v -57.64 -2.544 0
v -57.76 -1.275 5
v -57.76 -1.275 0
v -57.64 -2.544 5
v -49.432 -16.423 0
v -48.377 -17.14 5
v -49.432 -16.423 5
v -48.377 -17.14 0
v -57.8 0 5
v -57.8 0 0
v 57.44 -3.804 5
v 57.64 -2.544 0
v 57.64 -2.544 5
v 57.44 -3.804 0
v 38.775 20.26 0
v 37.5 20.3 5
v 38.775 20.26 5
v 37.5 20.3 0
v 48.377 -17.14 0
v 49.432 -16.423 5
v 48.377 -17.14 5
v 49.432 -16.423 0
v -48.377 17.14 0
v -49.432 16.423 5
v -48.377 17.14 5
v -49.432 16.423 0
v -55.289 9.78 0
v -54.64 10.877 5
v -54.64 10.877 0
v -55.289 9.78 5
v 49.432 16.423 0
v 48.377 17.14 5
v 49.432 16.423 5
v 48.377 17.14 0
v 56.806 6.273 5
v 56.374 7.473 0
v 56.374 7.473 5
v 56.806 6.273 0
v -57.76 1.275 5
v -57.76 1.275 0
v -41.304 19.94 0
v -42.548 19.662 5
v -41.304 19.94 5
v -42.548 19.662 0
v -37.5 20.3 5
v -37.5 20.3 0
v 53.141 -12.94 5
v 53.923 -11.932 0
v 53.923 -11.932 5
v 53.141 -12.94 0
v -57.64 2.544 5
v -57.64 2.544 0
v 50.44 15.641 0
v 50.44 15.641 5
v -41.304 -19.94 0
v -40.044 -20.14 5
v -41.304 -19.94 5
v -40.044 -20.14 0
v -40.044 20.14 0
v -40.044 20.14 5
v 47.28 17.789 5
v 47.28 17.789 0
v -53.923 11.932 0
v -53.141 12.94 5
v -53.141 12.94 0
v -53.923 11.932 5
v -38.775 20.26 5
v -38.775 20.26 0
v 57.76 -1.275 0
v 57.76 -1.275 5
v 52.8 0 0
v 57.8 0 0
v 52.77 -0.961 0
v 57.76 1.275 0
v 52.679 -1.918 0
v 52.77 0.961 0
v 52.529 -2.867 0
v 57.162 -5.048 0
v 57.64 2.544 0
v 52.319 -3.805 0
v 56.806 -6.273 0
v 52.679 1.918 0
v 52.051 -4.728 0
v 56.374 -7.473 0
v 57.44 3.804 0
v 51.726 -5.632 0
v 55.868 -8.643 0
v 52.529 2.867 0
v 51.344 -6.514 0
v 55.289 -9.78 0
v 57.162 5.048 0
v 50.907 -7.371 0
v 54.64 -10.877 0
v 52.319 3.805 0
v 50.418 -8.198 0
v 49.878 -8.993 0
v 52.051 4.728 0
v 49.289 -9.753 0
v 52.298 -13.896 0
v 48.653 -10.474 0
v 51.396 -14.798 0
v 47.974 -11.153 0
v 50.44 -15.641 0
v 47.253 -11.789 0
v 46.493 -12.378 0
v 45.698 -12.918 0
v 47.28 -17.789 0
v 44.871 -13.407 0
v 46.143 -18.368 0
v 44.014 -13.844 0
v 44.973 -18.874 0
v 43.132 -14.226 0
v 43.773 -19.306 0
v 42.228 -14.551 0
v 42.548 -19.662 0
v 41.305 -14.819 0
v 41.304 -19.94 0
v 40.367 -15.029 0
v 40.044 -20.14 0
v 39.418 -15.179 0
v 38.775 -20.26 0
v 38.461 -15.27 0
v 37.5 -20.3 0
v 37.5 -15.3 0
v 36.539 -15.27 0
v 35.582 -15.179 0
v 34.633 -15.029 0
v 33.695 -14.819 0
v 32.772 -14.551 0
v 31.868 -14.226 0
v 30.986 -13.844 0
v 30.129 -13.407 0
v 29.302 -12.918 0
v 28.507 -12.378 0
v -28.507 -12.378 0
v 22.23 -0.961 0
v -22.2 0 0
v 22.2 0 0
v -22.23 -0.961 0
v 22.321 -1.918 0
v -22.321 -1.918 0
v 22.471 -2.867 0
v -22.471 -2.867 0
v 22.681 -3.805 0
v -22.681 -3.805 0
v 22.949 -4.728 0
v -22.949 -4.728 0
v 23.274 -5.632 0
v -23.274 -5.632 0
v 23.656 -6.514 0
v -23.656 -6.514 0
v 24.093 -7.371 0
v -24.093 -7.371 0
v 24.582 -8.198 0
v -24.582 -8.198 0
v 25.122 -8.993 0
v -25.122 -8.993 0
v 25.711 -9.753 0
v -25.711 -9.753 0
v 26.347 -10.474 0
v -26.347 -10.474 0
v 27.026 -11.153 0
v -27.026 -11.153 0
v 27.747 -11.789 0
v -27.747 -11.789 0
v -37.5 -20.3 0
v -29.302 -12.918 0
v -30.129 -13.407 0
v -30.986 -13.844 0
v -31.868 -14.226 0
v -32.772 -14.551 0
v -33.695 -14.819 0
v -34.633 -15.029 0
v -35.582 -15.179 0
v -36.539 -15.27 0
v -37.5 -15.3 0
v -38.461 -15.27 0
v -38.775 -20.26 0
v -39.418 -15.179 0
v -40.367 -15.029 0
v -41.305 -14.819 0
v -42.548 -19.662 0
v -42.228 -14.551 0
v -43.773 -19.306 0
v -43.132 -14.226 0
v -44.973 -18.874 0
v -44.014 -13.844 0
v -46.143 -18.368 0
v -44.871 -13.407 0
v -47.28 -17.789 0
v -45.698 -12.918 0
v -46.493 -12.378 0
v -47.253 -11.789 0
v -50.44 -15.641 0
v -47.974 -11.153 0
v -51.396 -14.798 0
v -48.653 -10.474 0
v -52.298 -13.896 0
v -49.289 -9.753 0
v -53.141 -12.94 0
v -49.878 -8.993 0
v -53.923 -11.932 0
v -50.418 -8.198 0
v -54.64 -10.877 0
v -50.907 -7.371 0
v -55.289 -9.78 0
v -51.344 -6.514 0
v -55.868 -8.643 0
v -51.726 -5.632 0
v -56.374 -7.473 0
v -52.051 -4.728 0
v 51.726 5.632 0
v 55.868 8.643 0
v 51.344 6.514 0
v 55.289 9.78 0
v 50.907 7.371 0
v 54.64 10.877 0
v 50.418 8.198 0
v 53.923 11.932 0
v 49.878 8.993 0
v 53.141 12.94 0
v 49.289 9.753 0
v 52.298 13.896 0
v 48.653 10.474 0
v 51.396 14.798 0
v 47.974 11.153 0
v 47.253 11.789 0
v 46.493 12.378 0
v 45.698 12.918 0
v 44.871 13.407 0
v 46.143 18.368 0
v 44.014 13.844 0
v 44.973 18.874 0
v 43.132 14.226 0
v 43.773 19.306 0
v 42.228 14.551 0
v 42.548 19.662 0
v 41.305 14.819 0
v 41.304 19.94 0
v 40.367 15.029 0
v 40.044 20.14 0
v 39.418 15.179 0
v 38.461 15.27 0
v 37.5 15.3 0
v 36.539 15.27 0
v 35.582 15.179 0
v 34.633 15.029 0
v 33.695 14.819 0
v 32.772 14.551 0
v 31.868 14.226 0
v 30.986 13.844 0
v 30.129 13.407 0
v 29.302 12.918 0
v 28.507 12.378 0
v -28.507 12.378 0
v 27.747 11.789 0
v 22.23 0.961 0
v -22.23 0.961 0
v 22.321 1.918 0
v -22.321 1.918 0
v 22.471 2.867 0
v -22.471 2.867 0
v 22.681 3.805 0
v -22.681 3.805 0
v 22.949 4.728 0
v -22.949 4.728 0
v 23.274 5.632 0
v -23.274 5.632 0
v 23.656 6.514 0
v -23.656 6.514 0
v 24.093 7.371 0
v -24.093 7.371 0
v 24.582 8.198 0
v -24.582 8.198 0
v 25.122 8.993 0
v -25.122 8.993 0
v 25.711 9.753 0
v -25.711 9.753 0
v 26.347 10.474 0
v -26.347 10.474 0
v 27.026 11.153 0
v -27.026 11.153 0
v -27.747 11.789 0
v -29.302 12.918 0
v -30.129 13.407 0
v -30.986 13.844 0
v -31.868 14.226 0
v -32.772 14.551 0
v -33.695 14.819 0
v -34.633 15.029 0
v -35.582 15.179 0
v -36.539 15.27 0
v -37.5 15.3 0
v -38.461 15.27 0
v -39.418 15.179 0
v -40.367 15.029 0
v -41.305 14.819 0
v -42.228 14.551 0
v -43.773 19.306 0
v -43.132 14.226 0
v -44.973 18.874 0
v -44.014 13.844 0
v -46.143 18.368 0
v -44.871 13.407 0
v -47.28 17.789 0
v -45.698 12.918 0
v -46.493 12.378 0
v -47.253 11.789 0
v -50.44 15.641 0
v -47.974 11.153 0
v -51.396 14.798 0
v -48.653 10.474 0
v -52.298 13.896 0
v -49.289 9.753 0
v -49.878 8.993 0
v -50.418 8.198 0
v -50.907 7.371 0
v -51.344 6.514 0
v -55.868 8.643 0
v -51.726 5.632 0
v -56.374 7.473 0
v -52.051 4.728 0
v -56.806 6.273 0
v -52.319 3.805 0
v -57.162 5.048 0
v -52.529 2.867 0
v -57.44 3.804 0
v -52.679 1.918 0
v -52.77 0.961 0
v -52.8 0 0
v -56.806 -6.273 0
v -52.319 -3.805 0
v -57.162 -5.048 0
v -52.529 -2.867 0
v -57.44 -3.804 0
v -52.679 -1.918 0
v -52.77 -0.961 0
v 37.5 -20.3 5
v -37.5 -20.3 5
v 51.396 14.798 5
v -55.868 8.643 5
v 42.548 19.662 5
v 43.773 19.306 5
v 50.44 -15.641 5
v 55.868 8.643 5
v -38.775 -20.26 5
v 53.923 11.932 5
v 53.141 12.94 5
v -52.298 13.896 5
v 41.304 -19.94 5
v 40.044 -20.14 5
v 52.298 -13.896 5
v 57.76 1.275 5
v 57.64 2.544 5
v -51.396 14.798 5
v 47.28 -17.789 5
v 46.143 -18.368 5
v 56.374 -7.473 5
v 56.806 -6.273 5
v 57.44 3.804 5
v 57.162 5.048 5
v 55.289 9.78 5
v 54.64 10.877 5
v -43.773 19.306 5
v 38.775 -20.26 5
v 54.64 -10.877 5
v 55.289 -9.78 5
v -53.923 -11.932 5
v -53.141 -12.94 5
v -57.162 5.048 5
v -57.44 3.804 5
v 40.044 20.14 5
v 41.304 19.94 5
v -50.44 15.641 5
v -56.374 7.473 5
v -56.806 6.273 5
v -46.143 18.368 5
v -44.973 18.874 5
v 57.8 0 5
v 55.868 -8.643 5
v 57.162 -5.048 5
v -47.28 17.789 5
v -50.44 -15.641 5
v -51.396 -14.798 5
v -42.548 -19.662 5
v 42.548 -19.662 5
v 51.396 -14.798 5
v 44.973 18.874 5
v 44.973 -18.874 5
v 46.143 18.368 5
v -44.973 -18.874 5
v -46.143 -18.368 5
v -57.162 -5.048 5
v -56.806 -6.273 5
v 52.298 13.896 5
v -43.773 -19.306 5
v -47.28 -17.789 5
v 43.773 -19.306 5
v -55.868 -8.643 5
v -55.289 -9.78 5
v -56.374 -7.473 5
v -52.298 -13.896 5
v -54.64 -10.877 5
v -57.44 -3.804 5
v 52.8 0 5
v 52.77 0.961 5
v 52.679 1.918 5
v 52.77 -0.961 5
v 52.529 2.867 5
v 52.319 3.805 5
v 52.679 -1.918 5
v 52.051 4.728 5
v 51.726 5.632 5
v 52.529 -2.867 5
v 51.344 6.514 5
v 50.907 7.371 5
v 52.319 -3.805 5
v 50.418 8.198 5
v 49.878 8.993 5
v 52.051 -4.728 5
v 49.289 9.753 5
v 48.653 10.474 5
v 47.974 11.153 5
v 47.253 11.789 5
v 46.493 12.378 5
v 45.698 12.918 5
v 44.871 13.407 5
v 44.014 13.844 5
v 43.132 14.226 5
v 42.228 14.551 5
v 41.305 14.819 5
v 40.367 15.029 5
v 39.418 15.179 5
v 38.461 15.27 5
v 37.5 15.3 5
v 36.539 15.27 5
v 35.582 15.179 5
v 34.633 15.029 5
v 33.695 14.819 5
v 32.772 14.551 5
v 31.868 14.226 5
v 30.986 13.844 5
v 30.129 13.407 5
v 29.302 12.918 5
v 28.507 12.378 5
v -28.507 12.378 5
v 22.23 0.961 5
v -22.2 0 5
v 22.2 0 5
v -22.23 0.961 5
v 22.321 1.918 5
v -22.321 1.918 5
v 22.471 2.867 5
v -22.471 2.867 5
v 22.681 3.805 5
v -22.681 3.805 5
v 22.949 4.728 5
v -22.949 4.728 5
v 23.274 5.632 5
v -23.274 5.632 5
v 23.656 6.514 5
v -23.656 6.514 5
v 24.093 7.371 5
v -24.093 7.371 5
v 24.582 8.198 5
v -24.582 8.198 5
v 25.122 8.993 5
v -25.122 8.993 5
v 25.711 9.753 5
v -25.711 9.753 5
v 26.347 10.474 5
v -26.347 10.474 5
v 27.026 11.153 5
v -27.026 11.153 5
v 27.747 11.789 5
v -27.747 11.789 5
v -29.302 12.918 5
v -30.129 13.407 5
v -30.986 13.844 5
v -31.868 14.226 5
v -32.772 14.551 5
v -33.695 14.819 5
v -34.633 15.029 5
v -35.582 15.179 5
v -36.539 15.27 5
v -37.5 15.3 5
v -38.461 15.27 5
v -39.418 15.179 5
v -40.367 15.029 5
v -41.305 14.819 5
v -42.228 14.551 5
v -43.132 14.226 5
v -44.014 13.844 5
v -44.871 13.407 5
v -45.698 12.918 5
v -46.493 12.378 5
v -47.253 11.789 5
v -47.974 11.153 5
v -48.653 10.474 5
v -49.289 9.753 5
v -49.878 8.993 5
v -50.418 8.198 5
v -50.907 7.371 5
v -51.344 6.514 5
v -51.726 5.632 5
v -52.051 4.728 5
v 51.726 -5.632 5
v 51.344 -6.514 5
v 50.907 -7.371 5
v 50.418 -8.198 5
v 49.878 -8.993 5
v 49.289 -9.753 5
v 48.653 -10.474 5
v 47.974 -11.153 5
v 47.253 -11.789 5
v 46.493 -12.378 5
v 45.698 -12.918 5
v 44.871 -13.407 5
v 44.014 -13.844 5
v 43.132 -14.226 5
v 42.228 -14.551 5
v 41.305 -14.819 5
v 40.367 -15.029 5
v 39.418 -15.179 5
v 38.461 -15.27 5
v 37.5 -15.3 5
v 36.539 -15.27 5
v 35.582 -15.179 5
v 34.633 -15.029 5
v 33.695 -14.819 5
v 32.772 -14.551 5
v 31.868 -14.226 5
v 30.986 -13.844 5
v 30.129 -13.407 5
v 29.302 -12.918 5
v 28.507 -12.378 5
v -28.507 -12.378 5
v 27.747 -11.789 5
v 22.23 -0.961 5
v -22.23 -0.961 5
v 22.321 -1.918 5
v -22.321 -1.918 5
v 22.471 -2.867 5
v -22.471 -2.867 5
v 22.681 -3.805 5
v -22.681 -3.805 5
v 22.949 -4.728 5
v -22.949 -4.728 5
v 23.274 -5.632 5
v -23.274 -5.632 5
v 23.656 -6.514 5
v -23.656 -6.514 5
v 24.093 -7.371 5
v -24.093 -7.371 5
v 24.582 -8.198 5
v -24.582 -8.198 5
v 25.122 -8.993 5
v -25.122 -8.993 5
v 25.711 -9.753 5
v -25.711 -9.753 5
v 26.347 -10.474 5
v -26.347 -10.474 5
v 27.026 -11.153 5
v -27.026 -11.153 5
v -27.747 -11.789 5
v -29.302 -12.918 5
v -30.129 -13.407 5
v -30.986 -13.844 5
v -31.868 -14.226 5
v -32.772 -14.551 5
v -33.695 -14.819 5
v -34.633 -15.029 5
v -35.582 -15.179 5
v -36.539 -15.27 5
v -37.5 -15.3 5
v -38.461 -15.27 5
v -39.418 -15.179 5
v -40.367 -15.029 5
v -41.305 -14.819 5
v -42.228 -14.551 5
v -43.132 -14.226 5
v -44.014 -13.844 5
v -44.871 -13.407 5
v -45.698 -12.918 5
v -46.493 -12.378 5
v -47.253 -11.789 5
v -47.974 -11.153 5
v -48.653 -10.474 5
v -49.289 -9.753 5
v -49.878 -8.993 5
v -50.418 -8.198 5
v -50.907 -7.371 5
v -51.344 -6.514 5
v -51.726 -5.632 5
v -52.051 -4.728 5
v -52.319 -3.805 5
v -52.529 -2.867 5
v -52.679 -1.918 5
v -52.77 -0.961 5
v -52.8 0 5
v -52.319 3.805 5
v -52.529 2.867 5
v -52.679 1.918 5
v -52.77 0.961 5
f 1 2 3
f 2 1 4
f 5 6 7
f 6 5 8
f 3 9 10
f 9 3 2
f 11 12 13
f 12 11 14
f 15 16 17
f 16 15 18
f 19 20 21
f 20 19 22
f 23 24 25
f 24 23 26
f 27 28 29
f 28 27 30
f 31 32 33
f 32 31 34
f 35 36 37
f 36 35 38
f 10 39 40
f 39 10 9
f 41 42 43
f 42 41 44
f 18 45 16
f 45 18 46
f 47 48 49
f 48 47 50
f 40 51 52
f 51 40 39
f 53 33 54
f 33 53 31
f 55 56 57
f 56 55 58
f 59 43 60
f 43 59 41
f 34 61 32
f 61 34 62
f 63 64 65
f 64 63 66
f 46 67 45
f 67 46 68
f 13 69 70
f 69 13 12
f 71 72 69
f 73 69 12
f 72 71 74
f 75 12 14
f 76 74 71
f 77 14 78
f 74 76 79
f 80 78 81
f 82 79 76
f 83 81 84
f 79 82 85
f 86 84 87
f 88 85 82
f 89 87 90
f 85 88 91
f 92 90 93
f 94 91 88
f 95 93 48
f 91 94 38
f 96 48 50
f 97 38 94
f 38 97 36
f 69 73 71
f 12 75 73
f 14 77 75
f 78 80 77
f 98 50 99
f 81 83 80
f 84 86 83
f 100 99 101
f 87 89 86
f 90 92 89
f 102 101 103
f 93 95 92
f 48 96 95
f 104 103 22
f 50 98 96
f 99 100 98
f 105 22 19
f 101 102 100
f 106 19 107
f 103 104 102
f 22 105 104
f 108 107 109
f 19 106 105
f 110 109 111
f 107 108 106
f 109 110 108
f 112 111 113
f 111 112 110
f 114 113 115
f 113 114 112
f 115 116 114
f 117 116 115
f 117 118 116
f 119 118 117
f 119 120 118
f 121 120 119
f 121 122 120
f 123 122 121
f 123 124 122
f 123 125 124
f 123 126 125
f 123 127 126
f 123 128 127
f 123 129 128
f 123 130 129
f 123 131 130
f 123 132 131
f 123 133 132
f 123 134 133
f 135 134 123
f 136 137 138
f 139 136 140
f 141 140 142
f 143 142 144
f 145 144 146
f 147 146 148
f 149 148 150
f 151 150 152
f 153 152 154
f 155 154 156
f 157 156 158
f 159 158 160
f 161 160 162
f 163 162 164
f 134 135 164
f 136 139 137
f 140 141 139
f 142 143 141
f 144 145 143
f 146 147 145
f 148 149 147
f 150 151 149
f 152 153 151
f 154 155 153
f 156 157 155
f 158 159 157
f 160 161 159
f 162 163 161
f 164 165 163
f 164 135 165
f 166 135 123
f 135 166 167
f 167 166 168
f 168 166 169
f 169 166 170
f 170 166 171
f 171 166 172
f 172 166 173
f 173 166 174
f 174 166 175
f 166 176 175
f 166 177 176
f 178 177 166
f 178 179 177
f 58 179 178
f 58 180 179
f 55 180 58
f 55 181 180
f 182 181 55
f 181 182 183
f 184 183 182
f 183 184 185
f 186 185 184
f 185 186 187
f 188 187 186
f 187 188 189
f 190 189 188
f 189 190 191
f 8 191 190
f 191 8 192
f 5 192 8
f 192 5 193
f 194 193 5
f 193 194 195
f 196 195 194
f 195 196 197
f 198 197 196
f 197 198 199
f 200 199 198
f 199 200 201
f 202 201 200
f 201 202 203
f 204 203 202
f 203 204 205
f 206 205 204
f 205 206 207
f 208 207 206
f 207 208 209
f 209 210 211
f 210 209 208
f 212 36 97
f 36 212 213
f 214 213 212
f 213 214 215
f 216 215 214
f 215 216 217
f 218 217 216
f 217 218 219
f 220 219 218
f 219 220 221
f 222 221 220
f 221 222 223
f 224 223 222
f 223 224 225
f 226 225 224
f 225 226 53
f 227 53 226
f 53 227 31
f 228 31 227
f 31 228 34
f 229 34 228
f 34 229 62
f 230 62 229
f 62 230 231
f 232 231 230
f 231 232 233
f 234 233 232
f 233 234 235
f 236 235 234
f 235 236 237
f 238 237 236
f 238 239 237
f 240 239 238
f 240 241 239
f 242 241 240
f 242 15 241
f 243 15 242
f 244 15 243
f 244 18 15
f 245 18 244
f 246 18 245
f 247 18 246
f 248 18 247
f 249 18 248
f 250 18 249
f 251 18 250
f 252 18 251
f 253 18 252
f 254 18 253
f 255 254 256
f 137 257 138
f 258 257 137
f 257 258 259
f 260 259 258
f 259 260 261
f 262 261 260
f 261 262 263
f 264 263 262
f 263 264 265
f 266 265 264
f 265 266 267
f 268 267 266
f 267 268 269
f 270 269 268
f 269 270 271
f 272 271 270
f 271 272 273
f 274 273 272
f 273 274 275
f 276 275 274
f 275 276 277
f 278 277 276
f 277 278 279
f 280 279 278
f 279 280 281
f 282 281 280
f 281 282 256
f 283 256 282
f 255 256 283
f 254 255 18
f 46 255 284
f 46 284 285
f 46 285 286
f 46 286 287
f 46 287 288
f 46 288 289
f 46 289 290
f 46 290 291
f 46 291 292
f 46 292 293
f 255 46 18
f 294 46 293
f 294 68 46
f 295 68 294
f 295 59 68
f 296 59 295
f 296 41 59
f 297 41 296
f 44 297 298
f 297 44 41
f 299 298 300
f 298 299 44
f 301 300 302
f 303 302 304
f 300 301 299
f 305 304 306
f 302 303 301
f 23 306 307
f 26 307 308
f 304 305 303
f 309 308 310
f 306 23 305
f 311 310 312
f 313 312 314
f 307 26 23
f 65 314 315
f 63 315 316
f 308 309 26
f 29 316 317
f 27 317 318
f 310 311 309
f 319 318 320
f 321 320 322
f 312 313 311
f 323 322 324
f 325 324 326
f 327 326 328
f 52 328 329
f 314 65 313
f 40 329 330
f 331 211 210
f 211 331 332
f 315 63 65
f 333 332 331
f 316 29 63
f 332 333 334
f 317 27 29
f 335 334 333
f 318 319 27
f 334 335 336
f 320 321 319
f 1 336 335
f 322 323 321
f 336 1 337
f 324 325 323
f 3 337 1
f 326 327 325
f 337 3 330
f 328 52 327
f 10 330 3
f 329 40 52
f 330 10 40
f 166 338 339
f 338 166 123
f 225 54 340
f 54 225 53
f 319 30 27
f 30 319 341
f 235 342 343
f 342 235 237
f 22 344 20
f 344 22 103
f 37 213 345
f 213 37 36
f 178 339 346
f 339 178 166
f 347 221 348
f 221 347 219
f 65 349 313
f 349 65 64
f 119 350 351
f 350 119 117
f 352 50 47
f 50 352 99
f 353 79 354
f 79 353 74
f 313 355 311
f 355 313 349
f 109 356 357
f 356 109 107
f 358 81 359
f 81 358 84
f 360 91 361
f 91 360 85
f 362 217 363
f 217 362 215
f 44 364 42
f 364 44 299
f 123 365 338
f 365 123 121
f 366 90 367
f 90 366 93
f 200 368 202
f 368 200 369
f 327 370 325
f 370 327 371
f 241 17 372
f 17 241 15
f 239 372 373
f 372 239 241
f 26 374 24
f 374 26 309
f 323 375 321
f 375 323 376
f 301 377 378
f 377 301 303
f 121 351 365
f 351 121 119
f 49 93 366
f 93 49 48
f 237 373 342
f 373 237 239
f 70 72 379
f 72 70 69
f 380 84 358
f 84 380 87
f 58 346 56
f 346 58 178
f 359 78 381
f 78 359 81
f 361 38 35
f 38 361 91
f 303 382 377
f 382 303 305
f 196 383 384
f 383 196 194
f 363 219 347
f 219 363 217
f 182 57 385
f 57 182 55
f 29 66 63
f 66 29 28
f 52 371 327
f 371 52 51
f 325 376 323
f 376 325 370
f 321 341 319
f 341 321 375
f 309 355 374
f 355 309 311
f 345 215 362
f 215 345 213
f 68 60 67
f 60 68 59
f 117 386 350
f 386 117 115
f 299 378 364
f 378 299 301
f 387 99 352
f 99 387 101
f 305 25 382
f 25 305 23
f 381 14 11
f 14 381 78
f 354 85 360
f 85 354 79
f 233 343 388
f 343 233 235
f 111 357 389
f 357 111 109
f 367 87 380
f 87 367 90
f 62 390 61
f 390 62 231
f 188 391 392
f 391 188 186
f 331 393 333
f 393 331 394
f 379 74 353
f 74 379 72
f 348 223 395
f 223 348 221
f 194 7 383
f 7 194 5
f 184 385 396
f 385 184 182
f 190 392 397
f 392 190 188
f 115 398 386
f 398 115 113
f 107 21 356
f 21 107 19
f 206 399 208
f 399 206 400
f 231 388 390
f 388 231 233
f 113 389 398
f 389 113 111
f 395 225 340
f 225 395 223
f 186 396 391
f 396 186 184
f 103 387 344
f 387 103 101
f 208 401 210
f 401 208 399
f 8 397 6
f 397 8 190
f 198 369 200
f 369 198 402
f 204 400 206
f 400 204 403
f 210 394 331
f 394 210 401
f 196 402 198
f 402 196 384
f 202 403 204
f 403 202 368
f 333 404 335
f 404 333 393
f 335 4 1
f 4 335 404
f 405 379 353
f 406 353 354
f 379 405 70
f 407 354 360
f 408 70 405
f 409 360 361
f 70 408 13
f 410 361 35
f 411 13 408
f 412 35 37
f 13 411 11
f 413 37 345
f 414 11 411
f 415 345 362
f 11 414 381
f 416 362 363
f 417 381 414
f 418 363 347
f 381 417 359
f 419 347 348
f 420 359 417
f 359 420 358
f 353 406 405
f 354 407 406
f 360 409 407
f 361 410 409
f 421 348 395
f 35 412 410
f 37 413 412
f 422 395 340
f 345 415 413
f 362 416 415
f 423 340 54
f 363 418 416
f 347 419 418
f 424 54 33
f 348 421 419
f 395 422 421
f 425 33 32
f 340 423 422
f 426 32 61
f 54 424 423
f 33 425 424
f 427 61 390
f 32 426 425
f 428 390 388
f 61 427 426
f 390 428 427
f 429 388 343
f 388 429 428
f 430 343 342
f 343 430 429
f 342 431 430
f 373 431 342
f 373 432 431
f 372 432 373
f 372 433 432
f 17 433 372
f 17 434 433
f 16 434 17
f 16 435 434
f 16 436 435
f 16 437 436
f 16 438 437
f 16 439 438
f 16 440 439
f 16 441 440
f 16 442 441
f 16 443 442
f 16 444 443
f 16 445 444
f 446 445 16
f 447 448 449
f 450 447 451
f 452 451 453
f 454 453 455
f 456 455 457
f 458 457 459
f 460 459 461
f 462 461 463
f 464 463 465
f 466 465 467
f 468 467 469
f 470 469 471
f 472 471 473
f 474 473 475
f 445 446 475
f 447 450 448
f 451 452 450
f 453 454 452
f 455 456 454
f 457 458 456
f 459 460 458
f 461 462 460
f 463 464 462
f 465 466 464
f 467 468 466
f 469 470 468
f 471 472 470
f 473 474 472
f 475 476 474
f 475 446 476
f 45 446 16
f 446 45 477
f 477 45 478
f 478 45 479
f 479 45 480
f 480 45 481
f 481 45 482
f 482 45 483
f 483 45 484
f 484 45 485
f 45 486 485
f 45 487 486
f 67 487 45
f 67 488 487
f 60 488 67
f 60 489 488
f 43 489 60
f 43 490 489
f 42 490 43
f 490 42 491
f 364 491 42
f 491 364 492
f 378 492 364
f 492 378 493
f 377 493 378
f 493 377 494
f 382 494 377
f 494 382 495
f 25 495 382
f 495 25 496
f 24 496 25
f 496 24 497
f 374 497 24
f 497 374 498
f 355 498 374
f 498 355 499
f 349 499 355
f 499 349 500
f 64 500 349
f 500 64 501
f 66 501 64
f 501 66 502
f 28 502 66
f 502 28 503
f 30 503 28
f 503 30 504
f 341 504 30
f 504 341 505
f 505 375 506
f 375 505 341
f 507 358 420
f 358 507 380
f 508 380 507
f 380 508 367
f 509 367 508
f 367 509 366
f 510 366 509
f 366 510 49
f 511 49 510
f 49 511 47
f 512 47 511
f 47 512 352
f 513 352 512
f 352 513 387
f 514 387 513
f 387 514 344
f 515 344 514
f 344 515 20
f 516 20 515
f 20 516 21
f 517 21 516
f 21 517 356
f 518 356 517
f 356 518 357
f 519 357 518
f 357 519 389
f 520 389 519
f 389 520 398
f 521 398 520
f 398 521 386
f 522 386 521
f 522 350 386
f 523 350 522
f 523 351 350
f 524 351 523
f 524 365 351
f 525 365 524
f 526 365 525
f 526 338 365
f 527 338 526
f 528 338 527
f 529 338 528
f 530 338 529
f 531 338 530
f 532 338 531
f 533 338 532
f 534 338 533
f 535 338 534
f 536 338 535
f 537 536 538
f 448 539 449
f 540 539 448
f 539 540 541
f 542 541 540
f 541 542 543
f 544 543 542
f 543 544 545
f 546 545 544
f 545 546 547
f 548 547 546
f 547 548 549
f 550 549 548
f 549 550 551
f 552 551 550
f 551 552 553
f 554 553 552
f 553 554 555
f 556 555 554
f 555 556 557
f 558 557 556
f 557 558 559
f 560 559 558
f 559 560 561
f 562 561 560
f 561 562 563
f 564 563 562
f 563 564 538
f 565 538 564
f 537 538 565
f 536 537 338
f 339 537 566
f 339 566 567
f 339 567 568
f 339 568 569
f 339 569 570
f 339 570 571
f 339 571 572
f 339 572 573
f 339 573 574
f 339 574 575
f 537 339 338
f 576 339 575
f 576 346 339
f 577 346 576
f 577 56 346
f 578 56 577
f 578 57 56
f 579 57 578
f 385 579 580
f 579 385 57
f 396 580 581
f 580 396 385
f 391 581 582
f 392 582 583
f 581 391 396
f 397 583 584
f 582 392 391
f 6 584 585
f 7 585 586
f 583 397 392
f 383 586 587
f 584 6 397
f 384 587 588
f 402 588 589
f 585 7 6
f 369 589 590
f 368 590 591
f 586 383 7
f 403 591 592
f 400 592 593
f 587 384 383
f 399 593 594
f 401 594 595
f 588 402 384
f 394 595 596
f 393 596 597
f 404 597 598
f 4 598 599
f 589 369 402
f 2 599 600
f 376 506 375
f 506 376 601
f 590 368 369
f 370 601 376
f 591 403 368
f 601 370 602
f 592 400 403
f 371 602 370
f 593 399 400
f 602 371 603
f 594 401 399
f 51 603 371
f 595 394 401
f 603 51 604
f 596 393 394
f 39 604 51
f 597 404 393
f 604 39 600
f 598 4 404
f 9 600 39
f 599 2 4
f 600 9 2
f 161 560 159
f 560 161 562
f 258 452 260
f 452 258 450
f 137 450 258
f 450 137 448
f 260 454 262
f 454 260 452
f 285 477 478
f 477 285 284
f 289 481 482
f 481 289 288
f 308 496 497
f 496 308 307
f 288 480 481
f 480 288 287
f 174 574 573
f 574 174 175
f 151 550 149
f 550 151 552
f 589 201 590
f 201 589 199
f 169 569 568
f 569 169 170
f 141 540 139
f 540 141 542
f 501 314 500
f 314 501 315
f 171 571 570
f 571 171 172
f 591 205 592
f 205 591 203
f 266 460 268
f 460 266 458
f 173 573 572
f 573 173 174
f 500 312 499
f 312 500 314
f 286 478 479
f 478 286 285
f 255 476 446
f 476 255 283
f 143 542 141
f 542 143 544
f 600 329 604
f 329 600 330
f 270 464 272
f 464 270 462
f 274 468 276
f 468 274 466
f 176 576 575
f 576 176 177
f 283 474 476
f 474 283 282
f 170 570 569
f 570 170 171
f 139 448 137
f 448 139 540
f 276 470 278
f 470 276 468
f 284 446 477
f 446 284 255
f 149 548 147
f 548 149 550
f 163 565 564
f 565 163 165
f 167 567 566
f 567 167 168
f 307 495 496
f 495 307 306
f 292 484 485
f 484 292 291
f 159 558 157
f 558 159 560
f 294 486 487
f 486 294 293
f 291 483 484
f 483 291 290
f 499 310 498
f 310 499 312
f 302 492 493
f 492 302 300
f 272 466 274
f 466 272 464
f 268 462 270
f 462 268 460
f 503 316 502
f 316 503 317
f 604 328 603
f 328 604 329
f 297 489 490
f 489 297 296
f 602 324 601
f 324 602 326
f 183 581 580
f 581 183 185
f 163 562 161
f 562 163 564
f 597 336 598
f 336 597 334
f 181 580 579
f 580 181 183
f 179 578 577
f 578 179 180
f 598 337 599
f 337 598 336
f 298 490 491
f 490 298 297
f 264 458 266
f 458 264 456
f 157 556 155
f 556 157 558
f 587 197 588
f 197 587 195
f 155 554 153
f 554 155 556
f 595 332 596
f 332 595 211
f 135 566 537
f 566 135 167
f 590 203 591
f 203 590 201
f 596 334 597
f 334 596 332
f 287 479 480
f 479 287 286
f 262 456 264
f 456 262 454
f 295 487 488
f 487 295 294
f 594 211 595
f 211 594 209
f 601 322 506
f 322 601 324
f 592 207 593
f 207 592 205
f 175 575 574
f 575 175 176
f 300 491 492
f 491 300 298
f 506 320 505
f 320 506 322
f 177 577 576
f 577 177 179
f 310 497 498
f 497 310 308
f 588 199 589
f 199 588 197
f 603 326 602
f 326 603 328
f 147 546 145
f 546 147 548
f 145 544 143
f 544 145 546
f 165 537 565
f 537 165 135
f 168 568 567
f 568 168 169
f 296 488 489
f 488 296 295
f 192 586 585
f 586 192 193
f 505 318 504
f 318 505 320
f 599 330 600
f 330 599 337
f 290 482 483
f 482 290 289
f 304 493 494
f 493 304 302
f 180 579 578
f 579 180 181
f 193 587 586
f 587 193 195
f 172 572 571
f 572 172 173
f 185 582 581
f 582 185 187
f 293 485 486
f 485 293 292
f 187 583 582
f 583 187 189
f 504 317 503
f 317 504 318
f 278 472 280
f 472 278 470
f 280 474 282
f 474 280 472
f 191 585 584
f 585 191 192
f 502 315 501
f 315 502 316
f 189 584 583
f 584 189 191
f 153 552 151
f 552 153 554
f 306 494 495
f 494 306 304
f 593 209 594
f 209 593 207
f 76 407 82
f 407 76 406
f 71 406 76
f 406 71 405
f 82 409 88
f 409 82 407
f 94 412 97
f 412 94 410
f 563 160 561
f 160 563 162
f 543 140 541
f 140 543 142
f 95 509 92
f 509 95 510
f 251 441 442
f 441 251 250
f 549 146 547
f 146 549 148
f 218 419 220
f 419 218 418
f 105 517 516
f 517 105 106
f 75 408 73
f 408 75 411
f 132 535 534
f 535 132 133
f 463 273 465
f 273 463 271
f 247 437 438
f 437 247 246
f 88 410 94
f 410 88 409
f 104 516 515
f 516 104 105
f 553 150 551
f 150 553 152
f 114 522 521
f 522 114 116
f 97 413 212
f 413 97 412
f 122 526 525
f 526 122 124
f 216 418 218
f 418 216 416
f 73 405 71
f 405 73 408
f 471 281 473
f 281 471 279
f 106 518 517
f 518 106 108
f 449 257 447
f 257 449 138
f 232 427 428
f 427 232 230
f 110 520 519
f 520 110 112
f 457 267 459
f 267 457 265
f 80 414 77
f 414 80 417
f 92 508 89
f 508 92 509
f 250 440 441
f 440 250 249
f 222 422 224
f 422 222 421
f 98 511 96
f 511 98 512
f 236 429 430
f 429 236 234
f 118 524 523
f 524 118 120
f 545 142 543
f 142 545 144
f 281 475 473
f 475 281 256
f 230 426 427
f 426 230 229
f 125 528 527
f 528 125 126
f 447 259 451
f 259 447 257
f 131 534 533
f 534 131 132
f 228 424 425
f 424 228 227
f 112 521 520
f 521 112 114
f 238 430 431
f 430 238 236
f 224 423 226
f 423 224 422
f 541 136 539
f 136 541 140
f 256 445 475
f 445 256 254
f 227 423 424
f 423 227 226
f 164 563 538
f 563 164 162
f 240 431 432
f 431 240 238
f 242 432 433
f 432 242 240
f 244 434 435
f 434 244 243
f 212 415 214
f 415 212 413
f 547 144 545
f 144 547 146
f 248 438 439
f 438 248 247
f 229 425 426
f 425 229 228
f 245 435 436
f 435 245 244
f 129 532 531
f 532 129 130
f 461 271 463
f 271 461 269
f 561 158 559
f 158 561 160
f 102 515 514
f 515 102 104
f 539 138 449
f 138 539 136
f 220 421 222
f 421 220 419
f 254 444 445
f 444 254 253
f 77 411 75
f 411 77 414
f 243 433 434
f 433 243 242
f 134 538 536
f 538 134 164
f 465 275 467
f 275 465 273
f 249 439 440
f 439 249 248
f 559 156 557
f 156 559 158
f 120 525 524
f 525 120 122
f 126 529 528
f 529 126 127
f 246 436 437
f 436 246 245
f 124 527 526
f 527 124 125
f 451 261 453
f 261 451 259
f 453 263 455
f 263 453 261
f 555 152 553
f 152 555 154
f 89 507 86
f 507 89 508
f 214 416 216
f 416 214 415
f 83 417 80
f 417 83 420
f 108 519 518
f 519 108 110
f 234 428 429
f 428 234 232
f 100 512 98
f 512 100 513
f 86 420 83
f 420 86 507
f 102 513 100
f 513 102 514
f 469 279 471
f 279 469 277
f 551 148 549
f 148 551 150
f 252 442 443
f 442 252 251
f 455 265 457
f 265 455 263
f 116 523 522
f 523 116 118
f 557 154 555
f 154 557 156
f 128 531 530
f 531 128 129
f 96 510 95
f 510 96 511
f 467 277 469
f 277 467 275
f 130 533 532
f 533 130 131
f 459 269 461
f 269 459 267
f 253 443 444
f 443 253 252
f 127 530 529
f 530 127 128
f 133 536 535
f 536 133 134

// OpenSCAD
// SPDX-License-Identifier: CC-BY-4.0
// SPDX-FileCopyrightText: 2026 Todd Sayre
// ============================================================
// Turn-N-Tube shelf coupler — rigid lozenge collar
// Connects two adjacent shelf units at one tube height.
// Replaces zip ties: a lozenge collar slips over both vertical
// tube posts and holds them at a fixed spacing.
//
// The coupler DEFINES the spacing — it does not have to fit
// the units as they currently sit. Set the gap you want and
// the hole spacing follows from the tube and the tube-to-edge
// run on each unit. Nothing here depends on how far apart the
// units happen to be today.
//
// A deliberate gap is worth having: adjacent units rarely have
// their shelves at the same height, and the gap keeps that
// mismatch from reading as a misalignment.
//
// There is deliberately no gap-filling wall. An earlier version
// hung one below the collar to stiffen the pair and it did
// nothing: couplers are pinned at both ends by a round tube in
// a round hole, and every one of them runs the same direction,
// so the pair keeps a degree of freedom to shear sideways
// however many are fitted. A wall can only fight that with
// friction, and it lost. Printing it back would buy nothing —
// shelf_tube_brace.scad is the diagonal link that removes the
// freedom itself.
//
// PRINT NOTES:
// - PETG, no supports needed — a flat plate with round holes.
// - Print with the collar axis vertical (as modeled) so the
//   holes print round and the tube slides through cleanly.
// - Rests on the shelf below. Two per shelf level (front and
//   back post pair), 8 total for a 5-tier unit — the top shelf
//   has no tube above it.
// - These hold the spacing, not the squareness. Add one
//   shelf_tube_brace per pair of units.
// ============================================================

// MARK: Dimensions

// Measure the shelves
tube_od = 30; // mm
tube_to_edge = 20; // mm, tube to its shelf's facing edge

// Override only if the two units differ
left_tube_to_edge = tube_to_edge; // mm
right_tube_to_edge = tube_to_edge; // mm

// Gap between the units' facing shelf edges
shelf_gap = 5; // mm

// MARK: Tuning

hole_clearance = 0.6; // mm, on each hole; raise if too tight
wall_meat = 5; // mm, around each hole
collar_height = 5; // mm

$fn = 100;

// MARK: Derived

// Tube centre to tube centre: half a tube, the run out to each shelf
// edge, and the gap between those edges
center_distance = tube_od + left_tube_to_edge + shelf_gap + right_tube_to_edge;

hole_r = tube_od / 2 + hole_clearance / 2;
collar_r = hole_r + wall_meat;

// Narrowest material across the waist, between the two holes. The collar is
// only as strong as this, and it is what a very small shelf_gap eats into
waist = center_distance - 2 * hole_r;

// MARK: Checks

echo(str("center-to-center hole spacing = ", center_distance, " mm"));
echo(str("overall length = ", center_distance + 2 * collar_r, " mm"));
echo(str("waist between the holes = ", waist, " mm"));

assert(waist > 0, "the two holes have run together — shelf_gap plus the tube-to-edge runs has to beat hole_clearance");

// MARK: Geometry

// 2D lozenge (stadium) shape: hull of two circles
module lozenge_2d(r, cdist) {
  hull() {
    translate([-cdist / 2, 0])
      circle(r = r);
    translate([cdist / 2, 0])
      circle(r = r);
  }
}

module coupler() {
  difference() {
    linear_extrude(height = collar_height)
      lozenge_2d(collar_r, center_distance);

    // Through-holes for the two tube posts
    translate([-center_distance / 2, 0, -1])
      cylinder(r = hole_r, h = collar_height + 2);
    translate([center_distance / 2, 0, -1])
      cylinder(r = hole_r, h = collar_height + 2);
  }
}

coupler();
